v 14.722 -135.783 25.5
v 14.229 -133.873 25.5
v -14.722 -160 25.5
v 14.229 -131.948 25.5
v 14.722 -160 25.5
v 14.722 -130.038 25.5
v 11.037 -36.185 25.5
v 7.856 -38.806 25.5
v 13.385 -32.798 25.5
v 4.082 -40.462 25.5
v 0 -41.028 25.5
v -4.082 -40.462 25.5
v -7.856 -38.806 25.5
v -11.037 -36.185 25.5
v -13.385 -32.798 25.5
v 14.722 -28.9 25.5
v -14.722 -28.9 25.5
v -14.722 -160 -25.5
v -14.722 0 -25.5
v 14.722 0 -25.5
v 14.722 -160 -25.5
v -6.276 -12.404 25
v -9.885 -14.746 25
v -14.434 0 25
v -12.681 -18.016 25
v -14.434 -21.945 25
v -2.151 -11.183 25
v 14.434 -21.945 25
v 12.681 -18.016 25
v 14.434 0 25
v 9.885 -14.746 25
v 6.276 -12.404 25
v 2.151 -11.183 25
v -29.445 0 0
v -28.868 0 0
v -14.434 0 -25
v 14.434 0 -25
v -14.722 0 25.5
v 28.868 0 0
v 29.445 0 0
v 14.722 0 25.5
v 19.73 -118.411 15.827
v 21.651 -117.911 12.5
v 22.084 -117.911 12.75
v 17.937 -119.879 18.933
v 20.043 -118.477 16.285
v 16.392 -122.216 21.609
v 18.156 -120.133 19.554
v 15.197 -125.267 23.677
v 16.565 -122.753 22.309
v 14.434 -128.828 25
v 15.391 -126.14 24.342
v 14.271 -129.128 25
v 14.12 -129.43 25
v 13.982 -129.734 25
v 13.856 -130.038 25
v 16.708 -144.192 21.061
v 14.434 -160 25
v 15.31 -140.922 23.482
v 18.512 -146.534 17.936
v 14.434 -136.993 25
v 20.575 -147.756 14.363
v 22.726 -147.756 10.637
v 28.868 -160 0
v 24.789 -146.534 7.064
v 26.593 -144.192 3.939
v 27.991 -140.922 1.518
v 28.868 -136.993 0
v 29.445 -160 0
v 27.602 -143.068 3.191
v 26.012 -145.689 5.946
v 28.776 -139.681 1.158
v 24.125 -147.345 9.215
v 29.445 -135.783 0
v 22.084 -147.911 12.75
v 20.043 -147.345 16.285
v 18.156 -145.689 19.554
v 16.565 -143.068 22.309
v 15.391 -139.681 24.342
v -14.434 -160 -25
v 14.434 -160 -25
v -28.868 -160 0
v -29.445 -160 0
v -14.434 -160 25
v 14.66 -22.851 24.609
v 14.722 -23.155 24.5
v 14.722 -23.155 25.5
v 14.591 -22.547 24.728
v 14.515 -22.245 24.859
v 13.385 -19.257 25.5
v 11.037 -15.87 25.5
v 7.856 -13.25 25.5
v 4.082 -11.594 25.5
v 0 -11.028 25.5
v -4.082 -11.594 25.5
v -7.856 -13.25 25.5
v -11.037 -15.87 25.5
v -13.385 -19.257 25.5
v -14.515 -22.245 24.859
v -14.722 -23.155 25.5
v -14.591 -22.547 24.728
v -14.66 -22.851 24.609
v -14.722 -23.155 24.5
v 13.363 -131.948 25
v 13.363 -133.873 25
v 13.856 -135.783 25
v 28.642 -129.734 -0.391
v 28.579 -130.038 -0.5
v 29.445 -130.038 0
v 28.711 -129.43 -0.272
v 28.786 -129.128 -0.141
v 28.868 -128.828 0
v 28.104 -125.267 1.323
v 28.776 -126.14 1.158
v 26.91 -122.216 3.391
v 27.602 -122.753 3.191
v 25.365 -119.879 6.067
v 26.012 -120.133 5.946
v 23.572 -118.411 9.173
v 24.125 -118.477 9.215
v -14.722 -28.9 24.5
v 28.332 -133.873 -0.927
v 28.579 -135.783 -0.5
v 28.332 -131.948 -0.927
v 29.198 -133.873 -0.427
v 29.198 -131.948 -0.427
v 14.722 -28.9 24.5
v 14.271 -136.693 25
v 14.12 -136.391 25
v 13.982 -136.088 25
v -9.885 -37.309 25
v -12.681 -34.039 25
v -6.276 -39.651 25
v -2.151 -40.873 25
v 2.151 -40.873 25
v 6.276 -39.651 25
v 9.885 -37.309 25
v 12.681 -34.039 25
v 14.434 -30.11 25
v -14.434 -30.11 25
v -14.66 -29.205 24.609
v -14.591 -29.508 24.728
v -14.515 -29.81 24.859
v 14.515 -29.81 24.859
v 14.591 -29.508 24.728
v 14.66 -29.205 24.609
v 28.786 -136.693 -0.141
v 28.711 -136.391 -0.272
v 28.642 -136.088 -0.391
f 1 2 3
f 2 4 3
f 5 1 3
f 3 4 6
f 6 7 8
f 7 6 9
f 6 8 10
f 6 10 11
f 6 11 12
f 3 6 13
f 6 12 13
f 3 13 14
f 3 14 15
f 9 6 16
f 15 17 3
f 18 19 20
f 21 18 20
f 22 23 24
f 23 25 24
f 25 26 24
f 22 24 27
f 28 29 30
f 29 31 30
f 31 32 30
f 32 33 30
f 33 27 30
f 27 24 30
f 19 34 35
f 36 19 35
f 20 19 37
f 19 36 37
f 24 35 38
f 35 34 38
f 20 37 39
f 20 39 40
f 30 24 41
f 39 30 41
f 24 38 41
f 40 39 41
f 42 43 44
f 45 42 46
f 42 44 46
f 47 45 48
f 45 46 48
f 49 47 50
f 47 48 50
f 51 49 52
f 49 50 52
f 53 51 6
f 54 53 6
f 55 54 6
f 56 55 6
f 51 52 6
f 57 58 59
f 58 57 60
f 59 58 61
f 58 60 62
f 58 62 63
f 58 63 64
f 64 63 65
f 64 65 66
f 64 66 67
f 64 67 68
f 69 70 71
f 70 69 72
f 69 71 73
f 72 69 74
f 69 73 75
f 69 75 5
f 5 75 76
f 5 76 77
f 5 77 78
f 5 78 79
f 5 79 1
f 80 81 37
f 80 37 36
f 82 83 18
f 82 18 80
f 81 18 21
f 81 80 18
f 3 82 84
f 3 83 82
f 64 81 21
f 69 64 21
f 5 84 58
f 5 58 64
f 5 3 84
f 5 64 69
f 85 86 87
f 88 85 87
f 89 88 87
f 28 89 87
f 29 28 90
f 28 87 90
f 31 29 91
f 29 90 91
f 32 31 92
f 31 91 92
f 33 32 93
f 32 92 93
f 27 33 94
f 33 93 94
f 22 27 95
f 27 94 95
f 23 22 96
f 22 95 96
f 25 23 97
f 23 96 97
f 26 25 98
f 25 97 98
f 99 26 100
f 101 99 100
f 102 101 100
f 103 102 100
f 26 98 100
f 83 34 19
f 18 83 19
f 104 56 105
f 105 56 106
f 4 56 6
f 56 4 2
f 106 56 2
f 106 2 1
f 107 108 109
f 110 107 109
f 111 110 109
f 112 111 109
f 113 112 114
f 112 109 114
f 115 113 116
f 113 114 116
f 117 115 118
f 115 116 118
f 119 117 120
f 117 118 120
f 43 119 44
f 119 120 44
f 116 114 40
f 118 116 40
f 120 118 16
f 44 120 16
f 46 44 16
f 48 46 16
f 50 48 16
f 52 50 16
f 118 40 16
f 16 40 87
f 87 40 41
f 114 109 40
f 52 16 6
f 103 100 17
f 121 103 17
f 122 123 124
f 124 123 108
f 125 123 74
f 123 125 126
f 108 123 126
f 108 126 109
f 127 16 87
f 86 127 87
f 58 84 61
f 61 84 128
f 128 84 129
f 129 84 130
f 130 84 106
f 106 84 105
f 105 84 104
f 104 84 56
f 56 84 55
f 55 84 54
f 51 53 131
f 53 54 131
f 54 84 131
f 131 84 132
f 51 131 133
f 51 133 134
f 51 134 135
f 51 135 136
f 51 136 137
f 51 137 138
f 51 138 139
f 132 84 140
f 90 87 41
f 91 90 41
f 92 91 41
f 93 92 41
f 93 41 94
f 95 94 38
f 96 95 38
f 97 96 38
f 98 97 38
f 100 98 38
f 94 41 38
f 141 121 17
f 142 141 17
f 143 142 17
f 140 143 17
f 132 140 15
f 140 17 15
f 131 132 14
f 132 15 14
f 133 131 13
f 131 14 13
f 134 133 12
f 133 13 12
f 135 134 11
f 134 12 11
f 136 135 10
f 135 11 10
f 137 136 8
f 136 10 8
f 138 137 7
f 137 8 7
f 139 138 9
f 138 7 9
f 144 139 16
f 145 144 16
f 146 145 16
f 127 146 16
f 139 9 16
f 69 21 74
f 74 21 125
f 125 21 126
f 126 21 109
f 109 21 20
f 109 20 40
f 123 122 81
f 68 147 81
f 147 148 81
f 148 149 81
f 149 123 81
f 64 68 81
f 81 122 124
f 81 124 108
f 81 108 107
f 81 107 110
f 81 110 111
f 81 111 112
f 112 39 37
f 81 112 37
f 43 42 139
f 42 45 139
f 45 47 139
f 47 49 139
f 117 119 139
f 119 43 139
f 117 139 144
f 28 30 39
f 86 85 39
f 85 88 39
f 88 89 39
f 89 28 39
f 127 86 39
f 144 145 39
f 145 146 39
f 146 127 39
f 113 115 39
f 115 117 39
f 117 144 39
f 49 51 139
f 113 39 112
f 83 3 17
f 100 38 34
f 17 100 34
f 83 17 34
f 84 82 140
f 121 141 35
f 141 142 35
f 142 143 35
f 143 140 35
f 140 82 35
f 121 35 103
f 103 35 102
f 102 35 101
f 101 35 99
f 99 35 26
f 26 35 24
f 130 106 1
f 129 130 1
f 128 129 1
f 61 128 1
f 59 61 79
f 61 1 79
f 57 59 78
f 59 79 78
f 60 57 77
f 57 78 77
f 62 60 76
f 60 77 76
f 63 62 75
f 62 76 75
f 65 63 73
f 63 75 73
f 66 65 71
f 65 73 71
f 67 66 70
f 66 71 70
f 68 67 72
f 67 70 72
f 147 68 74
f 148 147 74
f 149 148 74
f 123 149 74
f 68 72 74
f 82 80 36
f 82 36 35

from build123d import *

# Parameters (mm, degrees)
F1_DEPTH = 160
F2_DEPTH = 140
F4_DEPTH = 1.4817621135
F6_DEPTH = 5


# Not quite as in the source:
# - a feature names something its author has since deleted; it is built from what else it names


with BuildPart() as f1:
    # F0 (on Front) → F1 (new body)
    with BuildSketch(Plane.XZ):
        Polygon((14.7224318643, 25.5), (-14.7224318643, 25.5), (-29.4448637287, 0), (-14.7224318643, -25.5), (14.7224318643, -25.5), (29.4448637287, 0), align=None)
        Polygon((-28.8675134595, 0), (-14.4337567297, 25), (14.4337567297, 25), (28.8675134595, 0), (14.4337567297, -25), (12.7224318643, -25), (-12.7224318643, -25), (-14.4337567297, -25), align=None, mode=Mode.SUBTRACT)
    extrude(amount=F1_DEPTH)

    # F0 (on Front) → F2 (join)
    with BuildSketch(Plane.XZ):
        Polygon((14.7224318643, 25.5), (-14.7224318643, 25.5), (-29.4448637287, 0), (-14.7224318643, -25.5), (14.7224318643, -25.5), (29.4448637287, 0), align=None)
        Polygon((-28.8675134595, 0), (-14.4337567297, 25), (14.4337567297, 25), (28.8675134595, 0), (14.4337567297, -25), (12.7224318643, -25), (-12.7224318643, -25), (-14.4337567297, -25), align=None, mode=Mode.SUBTRACT)
    extrude(amount=F2_DEPTH)

    # F3 (on face) → F4 (cut, through all)
    with BuildSketch(Plane(origin=(22.0836477965, 0, 12.75), x_dir=(0, 1, 0), z_dir=(0.8660254038, 0, 0.5))):
        with BuildLine():
            ThreePointArc((-130.0384322302, -14.7224318643), (-121.3330579218, -9.537184599), (-117.9107135534, 0))
            ThreePointArc((-117.9107135534, 0), (-121.3330579218, 9.537184599), (-130.0384322302, 14.7224318643))
            Line((-130.0384322302, 14.7224318643), (-135.7829948767, 14.7224318643))
            ThreePointArc((-135.7829948767, 14.7224318643), (-147.9107135534, 0), (-135.7829948767, -14.7224318643))
            Line((-135.7829948767, -14.7224318643), (-130.0384322302, -14.7224318643))
        make_face()
        with BuildLine():
            ThreePointArc((-135.7829948767, -14.7224318643), (-132.9107135534, -15), (-130.0384322302, -14.7224318643))
            Line((-130.0384322302, -14.7224318643), (-135.7829948767, -14.7224318643))
        make_face()
        with BuildLine():
            Line((-135.7829948767, 14.7224318643), (-130.0384322302, 14.7224318643))
            ThreePointArc((-130.0384322302, 14.7224318643), (-132.9107135534, 15), (-135.7829948767, 14.7224318643))
        make_face()
    extrude(amount=-F4_DEPTH, mode=Mode.SUBTRACT)

    # F5 (on face) → F6 (cut)
    with BuildSketch(Plane.XY.offset(25.5)):
        with BuildLine():
            Line((14.7224318643, -28.900016646), (14.7224318643, -23.1554539994))
            ThreePointArc((14.7224318643, -23.1554539994), (0, -11.0277353227), (-14.7224318643, -23.1554539994))
            Line((-14.7224318643, -23.1554539994), (-14.7224318643, -28.900016646))
            ThreePointArc((-14.7224318643, -28.900016646), (0, -41.0277353227), (14.7224318643, -28.900016646))
        make_face()
    extrude(amount=-F6_DEPTH, mode=Mode.SUBTRACT)


solid = f1.part
